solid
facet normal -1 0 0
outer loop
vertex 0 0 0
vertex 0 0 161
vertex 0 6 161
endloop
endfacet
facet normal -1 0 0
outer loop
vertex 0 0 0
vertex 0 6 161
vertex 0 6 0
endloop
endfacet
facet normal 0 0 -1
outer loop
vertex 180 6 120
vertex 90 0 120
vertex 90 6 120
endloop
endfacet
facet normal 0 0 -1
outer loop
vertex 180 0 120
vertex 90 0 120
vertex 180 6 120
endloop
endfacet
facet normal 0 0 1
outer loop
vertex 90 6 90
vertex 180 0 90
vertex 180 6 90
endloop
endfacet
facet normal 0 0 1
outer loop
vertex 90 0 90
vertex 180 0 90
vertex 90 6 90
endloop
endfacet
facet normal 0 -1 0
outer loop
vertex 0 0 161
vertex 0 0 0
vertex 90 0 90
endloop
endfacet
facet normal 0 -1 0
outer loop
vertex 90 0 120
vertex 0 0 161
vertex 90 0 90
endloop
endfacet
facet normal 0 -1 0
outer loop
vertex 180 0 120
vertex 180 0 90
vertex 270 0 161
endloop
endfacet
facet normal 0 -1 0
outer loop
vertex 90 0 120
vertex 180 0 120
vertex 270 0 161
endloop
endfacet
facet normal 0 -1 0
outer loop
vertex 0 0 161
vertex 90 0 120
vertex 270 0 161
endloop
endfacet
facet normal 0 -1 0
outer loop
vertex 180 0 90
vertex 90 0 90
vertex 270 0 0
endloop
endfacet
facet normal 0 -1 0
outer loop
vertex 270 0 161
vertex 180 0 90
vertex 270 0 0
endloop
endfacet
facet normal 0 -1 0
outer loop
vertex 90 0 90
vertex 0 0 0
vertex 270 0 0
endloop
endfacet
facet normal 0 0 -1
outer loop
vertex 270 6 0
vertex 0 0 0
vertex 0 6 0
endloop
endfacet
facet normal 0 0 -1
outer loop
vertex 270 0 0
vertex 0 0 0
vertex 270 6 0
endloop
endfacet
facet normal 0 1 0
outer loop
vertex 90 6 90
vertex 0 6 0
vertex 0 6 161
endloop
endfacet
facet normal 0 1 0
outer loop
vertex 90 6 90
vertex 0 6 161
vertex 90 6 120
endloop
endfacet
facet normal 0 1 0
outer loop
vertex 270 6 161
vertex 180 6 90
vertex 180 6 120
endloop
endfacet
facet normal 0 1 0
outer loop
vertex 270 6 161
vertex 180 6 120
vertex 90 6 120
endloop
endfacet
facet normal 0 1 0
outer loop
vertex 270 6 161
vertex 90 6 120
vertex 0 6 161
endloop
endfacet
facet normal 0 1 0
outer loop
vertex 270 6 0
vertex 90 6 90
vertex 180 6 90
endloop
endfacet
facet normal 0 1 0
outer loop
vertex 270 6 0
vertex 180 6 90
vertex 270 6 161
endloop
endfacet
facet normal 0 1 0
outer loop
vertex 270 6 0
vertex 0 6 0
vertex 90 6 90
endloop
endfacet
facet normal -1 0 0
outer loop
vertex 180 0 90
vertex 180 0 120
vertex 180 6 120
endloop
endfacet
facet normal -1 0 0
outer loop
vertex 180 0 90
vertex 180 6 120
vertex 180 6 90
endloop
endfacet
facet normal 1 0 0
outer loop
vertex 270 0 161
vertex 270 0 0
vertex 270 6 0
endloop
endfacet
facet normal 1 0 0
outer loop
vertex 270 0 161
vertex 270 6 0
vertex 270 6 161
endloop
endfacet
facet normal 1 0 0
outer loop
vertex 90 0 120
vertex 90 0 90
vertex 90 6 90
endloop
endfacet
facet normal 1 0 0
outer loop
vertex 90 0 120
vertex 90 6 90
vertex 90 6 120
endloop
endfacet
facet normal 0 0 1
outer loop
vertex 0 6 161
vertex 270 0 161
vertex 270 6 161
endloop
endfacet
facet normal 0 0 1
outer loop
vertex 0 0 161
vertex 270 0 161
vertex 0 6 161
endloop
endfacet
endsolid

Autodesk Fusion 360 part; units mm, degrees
sketch "Unsorted Smarties Back" plane through (0, 0, 0) normal (0, 1, 0) x (1, 0, 0)
  line L0 (0, 0) -> (270, 0)
  line L1 (270, 0) -> (270, -161)
  line L2 (270, -161) -> (0, -161)
  line L3 (0, -161) -> (0, 0)
  dimension "d1" = 270
  dimension "d2" = 161
extrude "Extrude1" add sketch "Unsorted Smarties Back" along normal blind 6
sketch "Smartie Feed" plane through (0, 0, 0) normal (0, -1, 0) x (1, 0, 0)
  line L0 (270, 161) -> (0, 161)
  line L1 (0, 161) -> (0, 0)
  line L2 (0, 0) -> (270, 0)
  line L3 (270, 0) -> (270, 161)
  line L4 (90, 120) -> (180, 120)
  line L5 (180, 120) -> (180, 90)
  line L6 (180, 90) -> (90, 90)
  line L7 (90, 90) -> (90, 120)
  dimension "d6" = 90
  dimension "d7" = 90
  dimension "d8" = 41
  dimension "d9" = 30
  dimension "d12" = 90
extrude "Extrude2" cut sketch "Smartie Feed" against normal blind 6 contours L4 L5 L6 L7
equation "mdfThickness = 6 mm" comment "Thickness of the MDF fibre board"
equation "d4 = mdfThickness"
equation "d10 = -mdfThickness"
